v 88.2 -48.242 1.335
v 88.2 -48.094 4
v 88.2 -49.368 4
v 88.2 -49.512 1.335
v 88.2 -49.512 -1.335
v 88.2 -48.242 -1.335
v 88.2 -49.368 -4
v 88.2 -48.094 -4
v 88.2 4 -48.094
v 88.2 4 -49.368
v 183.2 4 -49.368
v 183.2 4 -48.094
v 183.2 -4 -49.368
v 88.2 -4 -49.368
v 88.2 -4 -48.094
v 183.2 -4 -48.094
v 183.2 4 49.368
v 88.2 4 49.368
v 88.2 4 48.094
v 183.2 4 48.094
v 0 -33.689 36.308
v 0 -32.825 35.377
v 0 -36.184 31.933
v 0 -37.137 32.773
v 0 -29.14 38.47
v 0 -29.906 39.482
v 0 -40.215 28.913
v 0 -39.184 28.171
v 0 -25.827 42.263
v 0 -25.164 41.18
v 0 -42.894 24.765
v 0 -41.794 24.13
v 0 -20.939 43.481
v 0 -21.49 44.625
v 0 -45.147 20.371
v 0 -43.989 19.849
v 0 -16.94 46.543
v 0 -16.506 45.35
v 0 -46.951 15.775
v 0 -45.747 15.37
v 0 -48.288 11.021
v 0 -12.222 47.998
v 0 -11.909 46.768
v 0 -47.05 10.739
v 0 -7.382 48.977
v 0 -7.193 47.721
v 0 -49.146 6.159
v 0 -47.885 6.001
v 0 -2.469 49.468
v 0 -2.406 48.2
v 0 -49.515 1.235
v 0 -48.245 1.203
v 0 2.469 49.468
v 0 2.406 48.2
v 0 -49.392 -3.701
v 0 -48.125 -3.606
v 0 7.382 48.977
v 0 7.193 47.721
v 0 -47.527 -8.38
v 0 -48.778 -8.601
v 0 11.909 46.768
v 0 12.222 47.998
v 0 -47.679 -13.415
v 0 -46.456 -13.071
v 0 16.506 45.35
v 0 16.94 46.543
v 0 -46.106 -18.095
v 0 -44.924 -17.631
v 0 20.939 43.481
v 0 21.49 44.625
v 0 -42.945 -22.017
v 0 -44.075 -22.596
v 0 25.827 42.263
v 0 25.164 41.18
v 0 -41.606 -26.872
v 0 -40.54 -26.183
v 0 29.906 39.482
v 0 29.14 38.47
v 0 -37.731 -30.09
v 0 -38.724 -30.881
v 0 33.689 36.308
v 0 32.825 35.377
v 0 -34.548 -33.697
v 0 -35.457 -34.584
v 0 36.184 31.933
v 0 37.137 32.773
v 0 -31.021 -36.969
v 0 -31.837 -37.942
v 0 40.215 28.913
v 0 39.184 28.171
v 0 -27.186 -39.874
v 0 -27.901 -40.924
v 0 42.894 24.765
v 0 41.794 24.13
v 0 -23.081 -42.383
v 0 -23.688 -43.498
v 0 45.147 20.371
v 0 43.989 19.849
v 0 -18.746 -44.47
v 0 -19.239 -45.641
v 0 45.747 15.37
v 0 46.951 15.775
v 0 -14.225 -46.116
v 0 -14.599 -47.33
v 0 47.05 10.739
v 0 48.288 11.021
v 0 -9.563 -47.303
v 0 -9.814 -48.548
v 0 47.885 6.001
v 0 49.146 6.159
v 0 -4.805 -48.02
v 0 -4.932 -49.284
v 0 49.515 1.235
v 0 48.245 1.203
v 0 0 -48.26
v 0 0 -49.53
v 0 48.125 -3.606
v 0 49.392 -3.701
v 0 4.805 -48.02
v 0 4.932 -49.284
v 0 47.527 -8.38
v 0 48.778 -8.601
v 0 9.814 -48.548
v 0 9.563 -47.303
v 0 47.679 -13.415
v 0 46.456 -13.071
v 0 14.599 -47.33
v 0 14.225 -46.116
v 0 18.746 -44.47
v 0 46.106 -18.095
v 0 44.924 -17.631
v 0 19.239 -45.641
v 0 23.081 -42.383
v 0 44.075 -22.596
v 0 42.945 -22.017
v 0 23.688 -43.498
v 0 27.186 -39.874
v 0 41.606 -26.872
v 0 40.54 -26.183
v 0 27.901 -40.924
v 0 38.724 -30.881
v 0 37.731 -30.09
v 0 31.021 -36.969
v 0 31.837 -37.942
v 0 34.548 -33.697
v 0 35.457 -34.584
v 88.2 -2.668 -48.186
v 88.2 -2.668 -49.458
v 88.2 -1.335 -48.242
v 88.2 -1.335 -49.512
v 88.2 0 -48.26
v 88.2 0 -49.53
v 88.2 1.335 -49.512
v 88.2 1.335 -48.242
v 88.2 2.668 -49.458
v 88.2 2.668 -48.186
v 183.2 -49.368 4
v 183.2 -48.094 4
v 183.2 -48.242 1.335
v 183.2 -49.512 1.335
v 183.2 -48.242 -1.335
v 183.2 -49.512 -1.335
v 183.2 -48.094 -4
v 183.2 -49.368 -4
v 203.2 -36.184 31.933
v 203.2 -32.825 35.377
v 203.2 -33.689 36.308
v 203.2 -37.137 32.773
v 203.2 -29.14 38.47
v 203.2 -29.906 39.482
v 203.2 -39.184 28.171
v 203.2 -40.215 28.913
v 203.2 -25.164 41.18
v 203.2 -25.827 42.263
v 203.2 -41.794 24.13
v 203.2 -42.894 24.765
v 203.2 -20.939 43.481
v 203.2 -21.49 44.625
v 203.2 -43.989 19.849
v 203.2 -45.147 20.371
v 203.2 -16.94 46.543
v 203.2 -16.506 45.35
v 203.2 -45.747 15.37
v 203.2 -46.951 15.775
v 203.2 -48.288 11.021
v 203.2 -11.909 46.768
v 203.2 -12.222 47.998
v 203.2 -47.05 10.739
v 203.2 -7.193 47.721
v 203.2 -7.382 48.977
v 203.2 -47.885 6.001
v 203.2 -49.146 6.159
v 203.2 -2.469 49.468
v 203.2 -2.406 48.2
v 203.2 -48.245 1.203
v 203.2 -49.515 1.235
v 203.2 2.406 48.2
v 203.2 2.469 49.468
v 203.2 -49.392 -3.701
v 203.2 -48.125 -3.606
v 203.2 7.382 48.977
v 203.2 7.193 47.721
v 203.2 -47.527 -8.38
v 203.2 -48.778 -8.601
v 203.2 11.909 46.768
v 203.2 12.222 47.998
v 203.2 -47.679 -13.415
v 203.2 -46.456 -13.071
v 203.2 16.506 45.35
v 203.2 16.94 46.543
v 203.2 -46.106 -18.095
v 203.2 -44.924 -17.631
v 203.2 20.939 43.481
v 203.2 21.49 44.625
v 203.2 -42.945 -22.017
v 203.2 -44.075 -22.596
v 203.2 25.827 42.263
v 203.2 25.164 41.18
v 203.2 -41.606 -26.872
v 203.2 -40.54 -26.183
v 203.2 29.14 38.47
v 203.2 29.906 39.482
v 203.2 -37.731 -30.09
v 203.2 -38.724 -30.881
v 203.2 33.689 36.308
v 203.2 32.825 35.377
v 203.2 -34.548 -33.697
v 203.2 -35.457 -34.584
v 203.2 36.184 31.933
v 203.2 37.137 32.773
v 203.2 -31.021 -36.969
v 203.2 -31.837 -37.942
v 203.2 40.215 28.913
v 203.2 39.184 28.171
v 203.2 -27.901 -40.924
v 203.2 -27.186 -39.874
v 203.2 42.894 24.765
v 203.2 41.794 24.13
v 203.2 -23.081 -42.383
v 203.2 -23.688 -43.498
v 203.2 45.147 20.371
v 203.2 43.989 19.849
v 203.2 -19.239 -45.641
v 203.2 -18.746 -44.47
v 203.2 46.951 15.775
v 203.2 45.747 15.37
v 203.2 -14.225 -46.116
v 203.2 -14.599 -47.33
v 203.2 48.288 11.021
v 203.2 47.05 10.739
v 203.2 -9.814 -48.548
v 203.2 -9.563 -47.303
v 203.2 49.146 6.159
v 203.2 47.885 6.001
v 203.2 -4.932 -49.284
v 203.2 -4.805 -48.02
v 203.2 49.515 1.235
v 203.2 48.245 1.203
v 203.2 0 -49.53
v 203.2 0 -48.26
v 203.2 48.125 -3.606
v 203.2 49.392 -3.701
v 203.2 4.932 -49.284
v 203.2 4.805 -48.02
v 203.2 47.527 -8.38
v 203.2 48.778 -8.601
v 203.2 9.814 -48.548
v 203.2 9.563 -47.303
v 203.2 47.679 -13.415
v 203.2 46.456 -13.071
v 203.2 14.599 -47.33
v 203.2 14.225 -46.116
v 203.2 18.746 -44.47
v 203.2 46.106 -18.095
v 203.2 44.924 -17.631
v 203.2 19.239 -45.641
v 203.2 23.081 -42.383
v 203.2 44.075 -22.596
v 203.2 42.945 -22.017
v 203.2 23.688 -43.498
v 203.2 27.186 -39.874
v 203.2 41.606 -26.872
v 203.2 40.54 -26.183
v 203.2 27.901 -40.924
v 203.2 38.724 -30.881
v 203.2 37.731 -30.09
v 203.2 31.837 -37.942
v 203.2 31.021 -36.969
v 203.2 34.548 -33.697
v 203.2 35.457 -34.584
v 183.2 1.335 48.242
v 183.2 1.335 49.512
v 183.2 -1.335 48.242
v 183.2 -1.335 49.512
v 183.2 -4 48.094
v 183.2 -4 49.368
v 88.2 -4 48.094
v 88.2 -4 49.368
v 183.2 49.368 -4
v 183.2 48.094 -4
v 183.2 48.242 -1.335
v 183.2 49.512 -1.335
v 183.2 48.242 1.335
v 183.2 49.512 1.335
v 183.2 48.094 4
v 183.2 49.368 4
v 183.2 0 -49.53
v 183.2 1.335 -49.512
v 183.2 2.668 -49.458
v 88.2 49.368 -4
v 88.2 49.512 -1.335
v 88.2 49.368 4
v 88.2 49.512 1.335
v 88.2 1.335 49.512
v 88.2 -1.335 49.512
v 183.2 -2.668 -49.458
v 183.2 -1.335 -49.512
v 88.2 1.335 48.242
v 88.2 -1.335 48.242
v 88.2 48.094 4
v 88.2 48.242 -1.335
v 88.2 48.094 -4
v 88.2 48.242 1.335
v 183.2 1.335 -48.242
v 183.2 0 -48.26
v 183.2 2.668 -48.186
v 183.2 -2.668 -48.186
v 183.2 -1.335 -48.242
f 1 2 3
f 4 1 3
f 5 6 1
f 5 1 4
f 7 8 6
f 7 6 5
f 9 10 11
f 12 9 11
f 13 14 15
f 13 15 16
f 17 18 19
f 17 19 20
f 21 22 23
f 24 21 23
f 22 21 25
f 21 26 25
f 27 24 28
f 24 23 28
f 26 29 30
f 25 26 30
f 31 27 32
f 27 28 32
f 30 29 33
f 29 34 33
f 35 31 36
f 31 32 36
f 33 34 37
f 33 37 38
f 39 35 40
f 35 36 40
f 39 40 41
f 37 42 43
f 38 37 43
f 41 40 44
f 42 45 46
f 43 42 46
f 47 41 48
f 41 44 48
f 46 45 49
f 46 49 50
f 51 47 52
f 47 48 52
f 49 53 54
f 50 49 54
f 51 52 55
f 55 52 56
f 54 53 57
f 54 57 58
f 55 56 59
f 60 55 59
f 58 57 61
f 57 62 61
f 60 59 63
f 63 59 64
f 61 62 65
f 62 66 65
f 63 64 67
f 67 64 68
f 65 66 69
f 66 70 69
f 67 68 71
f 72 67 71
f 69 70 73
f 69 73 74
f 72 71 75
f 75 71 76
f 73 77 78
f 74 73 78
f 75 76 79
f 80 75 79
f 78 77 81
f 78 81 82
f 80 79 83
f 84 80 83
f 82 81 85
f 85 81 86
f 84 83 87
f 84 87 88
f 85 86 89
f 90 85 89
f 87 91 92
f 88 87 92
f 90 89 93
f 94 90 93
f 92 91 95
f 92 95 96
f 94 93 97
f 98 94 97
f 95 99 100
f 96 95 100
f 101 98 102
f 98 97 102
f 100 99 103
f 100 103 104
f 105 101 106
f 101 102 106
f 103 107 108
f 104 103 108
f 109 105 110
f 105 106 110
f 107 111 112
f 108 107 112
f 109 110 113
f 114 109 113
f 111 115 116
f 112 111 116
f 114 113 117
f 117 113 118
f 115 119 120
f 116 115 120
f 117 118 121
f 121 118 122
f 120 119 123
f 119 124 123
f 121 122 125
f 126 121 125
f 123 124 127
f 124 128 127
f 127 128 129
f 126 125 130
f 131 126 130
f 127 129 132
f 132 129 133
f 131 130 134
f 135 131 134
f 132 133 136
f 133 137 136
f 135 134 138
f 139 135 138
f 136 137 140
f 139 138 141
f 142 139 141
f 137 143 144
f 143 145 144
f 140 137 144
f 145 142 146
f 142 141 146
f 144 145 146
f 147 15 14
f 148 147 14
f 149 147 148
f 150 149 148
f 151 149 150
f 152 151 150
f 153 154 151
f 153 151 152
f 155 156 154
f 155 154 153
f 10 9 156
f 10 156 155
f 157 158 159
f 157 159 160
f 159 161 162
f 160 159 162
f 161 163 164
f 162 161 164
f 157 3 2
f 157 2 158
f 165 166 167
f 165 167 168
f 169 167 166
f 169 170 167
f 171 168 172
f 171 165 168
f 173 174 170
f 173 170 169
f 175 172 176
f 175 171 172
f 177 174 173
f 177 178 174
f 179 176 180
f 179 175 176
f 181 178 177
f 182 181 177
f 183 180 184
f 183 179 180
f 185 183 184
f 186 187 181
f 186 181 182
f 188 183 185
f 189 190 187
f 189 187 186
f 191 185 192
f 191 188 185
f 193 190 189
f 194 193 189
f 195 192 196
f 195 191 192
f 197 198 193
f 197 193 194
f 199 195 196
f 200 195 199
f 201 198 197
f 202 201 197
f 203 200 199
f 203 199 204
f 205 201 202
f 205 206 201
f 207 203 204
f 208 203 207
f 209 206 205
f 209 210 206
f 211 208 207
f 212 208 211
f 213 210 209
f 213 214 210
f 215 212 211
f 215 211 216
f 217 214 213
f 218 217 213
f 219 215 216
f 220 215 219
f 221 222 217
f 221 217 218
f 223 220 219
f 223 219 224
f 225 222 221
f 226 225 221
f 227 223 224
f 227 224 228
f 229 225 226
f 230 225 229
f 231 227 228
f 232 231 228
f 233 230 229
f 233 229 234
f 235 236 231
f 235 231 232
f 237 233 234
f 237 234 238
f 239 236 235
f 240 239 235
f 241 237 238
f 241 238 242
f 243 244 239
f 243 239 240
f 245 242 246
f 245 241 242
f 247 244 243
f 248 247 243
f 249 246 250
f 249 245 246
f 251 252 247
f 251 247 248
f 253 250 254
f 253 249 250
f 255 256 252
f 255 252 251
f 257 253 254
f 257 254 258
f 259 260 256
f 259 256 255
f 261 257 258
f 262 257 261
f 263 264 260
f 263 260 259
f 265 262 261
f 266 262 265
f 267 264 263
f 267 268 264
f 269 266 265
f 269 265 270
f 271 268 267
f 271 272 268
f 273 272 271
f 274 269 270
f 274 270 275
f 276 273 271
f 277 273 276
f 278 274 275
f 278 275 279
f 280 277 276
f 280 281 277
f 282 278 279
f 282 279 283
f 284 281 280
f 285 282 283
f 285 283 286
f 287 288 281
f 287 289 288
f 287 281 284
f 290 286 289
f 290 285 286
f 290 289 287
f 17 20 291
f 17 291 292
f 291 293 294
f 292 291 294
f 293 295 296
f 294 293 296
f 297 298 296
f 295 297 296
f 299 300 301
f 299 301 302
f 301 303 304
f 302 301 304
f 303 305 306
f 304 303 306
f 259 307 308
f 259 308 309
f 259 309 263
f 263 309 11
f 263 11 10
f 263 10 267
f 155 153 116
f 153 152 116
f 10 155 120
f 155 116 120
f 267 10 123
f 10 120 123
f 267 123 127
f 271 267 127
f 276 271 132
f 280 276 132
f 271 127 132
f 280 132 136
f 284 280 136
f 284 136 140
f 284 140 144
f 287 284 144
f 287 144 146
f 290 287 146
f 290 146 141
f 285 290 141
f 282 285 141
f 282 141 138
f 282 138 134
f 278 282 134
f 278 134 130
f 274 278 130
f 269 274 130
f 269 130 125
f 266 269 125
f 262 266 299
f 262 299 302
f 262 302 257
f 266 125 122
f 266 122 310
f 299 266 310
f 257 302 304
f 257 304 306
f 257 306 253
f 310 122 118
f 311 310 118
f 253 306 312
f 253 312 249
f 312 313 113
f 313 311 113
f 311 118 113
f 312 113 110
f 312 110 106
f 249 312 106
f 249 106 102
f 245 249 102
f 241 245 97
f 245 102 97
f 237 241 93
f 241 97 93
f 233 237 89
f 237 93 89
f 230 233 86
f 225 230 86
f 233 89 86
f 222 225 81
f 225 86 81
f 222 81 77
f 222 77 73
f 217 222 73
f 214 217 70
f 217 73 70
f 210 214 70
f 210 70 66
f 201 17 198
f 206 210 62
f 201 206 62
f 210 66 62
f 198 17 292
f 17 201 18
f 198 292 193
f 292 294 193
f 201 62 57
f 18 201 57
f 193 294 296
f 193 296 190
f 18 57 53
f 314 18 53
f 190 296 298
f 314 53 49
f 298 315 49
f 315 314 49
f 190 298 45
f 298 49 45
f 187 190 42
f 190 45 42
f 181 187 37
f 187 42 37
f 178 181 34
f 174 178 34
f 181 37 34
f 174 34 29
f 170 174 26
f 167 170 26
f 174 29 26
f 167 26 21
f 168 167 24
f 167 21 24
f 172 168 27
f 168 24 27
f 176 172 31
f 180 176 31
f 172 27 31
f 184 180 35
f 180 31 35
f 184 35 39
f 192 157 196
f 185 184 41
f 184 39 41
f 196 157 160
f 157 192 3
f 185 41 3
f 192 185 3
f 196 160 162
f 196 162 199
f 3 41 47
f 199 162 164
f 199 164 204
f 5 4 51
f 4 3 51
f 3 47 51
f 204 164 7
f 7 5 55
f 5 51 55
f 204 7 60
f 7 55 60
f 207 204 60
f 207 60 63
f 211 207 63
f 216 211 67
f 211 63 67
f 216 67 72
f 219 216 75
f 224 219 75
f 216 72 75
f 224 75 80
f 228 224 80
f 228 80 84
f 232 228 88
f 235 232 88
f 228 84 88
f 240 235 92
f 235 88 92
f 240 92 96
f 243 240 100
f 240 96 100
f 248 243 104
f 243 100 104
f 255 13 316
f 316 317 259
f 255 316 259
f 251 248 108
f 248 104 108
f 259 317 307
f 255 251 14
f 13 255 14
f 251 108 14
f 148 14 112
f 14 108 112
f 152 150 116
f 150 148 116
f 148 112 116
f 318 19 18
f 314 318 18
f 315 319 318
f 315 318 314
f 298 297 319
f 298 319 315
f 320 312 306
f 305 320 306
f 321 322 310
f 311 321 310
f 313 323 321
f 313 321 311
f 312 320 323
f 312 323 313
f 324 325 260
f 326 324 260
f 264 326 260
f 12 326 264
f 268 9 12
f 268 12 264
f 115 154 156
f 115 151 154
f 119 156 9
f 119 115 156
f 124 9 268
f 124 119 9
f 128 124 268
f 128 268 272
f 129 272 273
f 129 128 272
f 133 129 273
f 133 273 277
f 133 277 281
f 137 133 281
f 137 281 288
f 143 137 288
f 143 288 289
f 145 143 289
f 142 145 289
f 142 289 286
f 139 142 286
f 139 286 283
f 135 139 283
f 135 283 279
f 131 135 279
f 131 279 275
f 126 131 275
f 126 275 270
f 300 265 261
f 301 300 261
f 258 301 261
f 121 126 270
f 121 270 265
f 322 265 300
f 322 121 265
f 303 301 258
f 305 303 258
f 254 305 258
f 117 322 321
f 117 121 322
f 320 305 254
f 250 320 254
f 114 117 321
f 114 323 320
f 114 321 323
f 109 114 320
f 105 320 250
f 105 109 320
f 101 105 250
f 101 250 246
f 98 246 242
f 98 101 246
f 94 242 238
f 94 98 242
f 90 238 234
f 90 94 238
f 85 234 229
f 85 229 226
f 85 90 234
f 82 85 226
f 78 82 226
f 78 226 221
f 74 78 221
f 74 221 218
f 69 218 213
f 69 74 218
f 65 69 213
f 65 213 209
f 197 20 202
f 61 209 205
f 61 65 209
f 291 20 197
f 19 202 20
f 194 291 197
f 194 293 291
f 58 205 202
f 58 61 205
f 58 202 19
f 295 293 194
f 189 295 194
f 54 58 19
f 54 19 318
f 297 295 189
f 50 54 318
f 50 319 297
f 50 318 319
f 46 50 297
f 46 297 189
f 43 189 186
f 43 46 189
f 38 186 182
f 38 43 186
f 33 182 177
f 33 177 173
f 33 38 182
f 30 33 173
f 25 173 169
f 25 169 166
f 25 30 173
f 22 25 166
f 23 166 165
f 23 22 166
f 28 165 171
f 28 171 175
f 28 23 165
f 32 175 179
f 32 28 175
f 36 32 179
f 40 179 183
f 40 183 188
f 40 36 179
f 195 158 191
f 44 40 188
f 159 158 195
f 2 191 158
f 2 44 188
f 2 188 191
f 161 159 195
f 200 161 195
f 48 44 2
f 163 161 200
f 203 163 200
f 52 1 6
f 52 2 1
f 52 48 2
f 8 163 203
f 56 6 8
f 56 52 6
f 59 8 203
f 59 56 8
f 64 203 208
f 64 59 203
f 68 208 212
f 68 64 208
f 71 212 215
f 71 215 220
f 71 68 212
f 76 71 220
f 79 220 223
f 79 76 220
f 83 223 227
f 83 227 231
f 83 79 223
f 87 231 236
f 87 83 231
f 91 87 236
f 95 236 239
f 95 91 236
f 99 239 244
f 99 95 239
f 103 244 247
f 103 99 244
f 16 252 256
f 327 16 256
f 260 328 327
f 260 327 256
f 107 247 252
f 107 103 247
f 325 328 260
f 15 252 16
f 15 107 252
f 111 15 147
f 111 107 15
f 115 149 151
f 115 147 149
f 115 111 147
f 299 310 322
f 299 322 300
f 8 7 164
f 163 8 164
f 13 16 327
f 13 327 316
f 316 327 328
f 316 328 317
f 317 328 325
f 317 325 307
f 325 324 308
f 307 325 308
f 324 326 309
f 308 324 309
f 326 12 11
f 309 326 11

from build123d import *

# Parameters (mm, degrees)
SKETCH2_R           = 49.53
SKETCH2_R_2         = 48.26
BOSS_EXTRUDE1_DEPTH = 203.2
SKETCH4_W           = 95
SKETCH4_H           = 4
CUT_EXTRUDE1_DEPTH  = 4
CIRPATTERN1_COUNT   = 4


with BuildPart() as part:
    # Sketch2 → Boss-Extrude1 (new body)
    with BuildSketch(Plane(origin=(0, 0, 0), x_dir=(0, 0, -1), z_dir=(1, 0, 0))):
        Circle(SKETCH2_R)
        Circle(SKETCH2_R_2, mode=Mode.SUBTRACT)
    extrude(amount=BOSS_EXTRUDE1_DEPTH)

    # Sketch4 → Cut-Extrude1 (cut, symmetric)
    with BuildSketch(Plane.XY):
        with Locations((135.7, 47.53)):
            Rectangle(SKETCH4_W, SKETCH4_H)
    cut_extrude1 = extrude(amount=CUT_EXTRUDE1_DEPTH, both=True, mode=Mode.SUBTRACT)

    # CirPattern1: Cut-Extrude1 ×4 about axis
    cirpattern1_axis = Axis((0, 0, 0), (1, 0, 0))
    for i in range(1, CIRPATTERN1_COUNT):
        add(cut_extrude1.rotate(cirpattern1_axis, i * 360 / CIRPATTERN1_COUNT), mode=Mode.SUBTRACT)


solid = part.part
